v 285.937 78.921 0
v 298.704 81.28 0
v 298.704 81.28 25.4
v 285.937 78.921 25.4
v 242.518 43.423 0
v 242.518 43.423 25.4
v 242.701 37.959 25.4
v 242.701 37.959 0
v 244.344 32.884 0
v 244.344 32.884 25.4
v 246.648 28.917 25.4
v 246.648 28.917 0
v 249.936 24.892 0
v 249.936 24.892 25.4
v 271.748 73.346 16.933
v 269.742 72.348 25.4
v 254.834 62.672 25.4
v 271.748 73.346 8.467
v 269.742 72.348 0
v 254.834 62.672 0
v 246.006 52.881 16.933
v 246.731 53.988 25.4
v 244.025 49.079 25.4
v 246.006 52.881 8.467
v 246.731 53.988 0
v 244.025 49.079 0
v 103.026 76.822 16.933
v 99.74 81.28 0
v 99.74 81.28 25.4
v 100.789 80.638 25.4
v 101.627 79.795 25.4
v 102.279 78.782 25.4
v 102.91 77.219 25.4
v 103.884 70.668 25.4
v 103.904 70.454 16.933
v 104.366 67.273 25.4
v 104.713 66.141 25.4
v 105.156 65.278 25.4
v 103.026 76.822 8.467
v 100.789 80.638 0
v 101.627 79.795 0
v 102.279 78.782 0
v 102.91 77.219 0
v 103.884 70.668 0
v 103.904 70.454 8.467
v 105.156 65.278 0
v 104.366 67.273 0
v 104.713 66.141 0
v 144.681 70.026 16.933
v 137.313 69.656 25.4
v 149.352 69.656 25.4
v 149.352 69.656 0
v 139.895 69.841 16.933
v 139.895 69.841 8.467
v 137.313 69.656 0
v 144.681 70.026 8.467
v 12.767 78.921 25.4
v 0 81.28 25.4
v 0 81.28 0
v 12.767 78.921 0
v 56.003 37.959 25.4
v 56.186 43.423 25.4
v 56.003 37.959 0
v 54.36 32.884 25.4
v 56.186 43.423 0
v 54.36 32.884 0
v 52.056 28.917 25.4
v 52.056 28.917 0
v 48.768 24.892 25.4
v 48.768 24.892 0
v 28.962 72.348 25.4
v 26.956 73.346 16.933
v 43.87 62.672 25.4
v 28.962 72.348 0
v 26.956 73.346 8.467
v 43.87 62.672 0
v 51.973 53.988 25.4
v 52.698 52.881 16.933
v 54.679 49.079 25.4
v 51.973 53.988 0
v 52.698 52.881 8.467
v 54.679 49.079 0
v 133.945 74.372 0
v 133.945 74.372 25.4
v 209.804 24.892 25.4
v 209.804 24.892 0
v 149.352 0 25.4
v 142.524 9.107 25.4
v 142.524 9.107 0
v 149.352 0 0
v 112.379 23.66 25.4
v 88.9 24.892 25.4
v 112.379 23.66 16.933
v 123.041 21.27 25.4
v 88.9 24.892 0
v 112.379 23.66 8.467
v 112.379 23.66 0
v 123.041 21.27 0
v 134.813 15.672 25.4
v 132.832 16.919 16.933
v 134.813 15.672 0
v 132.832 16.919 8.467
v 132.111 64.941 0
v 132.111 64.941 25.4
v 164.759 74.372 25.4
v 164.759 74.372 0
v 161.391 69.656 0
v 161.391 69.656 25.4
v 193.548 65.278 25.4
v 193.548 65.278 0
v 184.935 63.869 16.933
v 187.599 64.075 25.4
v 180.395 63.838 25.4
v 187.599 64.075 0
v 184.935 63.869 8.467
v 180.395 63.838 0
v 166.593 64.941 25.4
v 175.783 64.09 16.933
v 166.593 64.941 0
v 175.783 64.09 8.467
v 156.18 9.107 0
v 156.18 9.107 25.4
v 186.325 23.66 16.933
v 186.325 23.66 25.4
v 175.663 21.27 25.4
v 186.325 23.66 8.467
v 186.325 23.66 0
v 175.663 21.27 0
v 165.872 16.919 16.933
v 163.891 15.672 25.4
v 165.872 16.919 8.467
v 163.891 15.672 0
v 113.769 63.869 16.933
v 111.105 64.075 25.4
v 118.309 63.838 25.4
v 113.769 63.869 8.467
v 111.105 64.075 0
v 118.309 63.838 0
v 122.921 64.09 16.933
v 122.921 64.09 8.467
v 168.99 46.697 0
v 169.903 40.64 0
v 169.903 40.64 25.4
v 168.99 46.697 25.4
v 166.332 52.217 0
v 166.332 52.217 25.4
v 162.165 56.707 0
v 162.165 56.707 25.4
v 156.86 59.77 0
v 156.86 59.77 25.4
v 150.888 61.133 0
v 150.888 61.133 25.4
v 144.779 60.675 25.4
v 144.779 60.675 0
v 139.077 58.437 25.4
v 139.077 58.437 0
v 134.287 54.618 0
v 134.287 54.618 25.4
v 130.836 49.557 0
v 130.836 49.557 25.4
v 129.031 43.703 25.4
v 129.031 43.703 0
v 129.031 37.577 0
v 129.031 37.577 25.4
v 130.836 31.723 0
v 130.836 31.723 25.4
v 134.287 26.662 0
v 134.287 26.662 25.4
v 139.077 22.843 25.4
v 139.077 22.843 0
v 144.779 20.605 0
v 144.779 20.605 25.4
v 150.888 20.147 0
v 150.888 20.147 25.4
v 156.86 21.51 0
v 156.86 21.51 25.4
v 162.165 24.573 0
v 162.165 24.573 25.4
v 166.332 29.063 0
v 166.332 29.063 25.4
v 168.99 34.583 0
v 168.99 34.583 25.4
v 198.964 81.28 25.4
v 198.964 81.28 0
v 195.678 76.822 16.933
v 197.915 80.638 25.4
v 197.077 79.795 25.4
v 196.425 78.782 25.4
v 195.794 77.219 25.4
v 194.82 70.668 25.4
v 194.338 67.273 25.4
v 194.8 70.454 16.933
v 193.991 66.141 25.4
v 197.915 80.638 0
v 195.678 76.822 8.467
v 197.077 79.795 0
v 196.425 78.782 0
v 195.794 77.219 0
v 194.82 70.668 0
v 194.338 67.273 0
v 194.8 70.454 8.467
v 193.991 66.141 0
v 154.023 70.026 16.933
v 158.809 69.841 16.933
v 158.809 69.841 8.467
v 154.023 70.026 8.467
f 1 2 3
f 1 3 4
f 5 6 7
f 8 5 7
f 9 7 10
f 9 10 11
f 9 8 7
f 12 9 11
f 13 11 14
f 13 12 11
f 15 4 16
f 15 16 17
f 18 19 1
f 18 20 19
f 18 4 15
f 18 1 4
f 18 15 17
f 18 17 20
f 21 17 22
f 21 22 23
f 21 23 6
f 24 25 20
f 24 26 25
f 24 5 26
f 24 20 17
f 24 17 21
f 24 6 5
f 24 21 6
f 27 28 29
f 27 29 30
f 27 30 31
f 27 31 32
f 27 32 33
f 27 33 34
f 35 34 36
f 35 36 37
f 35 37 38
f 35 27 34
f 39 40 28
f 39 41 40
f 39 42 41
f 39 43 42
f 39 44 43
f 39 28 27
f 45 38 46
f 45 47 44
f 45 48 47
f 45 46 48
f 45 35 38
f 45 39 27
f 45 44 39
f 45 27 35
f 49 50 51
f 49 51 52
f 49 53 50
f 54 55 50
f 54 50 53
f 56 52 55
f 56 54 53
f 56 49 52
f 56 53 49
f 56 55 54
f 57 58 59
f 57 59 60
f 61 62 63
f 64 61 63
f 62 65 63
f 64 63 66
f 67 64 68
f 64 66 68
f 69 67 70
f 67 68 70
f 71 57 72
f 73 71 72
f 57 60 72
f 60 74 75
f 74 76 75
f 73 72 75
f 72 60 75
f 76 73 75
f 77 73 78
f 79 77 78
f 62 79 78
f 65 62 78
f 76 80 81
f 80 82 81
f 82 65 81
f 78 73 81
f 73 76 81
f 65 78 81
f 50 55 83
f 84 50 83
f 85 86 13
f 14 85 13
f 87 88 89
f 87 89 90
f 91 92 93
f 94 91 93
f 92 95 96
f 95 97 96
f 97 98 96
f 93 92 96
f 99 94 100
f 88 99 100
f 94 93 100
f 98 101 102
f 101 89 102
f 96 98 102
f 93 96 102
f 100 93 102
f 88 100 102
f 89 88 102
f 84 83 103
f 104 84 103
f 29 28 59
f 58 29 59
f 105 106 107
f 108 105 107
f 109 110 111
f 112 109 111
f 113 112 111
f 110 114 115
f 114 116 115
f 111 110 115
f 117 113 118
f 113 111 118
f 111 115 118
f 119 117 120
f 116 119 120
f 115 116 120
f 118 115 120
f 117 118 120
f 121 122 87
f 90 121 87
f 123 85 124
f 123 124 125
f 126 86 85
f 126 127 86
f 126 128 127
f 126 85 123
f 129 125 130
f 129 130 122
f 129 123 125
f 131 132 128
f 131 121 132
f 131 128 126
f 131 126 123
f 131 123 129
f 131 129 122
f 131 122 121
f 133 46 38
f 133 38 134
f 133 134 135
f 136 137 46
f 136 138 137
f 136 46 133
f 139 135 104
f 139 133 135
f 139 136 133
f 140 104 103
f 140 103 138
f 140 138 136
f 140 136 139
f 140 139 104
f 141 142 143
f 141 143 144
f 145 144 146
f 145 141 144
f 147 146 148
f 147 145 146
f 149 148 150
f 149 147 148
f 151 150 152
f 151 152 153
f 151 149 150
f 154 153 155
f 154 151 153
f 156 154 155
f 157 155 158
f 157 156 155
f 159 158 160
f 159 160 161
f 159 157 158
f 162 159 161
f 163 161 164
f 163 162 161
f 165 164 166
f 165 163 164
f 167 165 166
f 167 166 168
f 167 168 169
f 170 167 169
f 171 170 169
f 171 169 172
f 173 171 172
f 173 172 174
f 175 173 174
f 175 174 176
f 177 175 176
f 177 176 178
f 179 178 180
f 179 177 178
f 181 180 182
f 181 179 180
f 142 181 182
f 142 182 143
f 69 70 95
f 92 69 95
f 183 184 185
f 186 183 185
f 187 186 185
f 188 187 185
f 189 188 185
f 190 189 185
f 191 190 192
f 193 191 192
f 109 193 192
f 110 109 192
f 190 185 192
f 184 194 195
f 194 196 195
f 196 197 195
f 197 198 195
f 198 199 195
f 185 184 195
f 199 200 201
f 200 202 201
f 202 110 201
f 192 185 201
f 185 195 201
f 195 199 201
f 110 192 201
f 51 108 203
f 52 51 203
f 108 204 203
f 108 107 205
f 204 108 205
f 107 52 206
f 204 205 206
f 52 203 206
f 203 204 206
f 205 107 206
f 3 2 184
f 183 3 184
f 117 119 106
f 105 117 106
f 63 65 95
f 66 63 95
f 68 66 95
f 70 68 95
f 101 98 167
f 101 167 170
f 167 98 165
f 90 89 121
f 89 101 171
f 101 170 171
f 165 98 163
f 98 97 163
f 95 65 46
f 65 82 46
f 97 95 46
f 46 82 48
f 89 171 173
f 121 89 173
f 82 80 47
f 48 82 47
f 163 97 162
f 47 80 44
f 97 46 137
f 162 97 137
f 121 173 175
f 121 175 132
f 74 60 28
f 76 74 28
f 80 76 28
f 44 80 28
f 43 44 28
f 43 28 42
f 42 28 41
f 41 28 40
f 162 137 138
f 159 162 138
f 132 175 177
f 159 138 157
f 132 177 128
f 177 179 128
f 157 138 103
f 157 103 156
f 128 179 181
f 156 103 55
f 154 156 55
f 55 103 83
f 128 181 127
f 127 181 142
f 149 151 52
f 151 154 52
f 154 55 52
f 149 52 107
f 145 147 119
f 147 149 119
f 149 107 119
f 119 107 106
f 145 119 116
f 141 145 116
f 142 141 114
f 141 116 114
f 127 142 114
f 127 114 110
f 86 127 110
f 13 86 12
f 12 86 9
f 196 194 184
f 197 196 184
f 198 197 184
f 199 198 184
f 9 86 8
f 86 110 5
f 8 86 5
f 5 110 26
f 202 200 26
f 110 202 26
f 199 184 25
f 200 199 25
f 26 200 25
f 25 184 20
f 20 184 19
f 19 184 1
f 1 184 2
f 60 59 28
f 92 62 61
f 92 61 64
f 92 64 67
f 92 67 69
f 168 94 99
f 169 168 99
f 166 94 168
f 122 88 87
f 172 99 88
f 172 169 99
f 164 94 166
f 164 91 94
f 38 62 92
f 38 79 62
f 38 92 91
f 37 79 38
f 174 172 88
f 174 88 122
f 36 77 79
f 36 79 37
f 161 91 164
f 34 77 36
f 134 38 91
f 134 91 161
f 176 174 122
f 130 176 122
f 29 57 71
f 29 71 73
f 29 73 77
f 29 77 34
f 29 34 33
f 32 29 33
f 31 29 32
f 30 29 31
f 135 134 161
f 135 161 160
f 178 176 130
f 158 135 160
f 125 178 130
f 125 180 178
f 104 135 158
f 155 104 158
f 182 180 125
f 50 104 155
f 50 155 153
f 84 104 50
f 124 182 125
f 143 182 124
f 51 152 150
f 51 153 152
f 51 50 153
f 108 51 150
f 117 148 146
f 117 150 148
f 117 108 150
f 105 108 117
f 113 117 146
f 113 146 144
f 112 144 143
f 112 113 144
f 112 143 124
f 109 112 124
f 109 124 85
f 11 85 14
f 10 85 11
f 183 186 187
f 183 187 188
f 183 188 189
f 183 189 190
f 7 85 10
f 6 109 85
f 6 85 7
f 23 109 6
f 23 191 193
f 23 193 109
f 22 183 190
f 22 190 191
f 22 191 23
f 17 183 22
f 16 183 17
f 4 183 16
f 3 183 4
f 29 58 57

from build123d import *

# Parameters (mm, degrees)
F0_R     = 20.550681
F1_DEPTH = 25.4


with BuildPart() as f1:
    # F0 (on Top) → F1 (new body)
    with BuildSketch(Plane.XY):
        with BuildLine():
            Line((48.768, 81.28), (0, 81.28))
            add(Edge.make_bspline(
                [(0, 81.28), (18.076837, 81.28), (77.019423, 54.973345), (48.768, 24.892)],
                knots=[0, 0, 0, 0, 74.551488, 74.551488, 74.551488, 74.551488], degree=3))
            Line((48.768, 24.892), (88.9, 24.892))
            add(Edge.make_bspline(
                [(88.9, 24.892), (113.589637, 24.856698), (135.101527, 23.565983), (149.352, 0)],
                knots=[0, 0, 0, 0, 65.376265, 65.376265, 65.376265, 65.376265], degree=3))
            add(Edge.make_bspline(
                [(209.804, 24.892), (185.114363, 24.856698), (163.602473, 23.565983), (149.352, 0)],
                knots=[0, 0, 0, 0, 65.376265, 65.376265, 65.376265, 65.376265], degree=3))
            Line((209.804, 24.892), (249.936, 24.892))
            add(Edge.make_bspline(
                [(298.704, 81.28), (280.627163, 81.28), (221.684577, 54.973345), (249.936, 24.892)],
                knots=[0, 0, 0, 0, 74.551488, 74.551488, 74.551488, 74.551488], degree=3))
            Line((298.704, 81.28), (198.964478, 81.28))
            add(Edge.make_bspline(
                [(198.964478, 81.28), (193.548, 78.810617), (195.913056, 68.824157), (193.548, 65.278)],
                knots=[0, 0, 0, 0, 16.893852, 16.893852, 16.893852, 16.893852], degree=3))
            add(Edge.make_bspline(
                [(193.548, 65.278), (185.371795, 62.721319), (175.635478, 64.108327), (166.593328, 64.940535)],
                knots=[0, 0, 0, 0, 26.956784, 26.956784, 26.956784, 26.956784], degree=3))
            Line((166.593328, 64.940535), (164.759207, 74.372195))
            Line((164.759207, 74.372195), (161.391426, 69.656365))
            add(Edge.make_bspline(
                [(161.391426, 69.656365), (160.683038, 69.656365), (153.193192, 70.488572), (149.352, 69.656365)],
                knots=[0, 0, 0, 0, 12.039426, 12.039426, 12.039426, 12.039426], degree=3))
            add(Edge.make_bspline(
                [(137.312574, 69.656365), (138.020962, 69.656365), (145.510808, 70.488572), (149.352, 69.656365)],
                knots=[0, 0, 0, 0, 12.039426, 12.039426, 12.039426, 12.039426], degree=3))
            Line((137.312574, 69.656365), (133.944793, 74.372195))
            Line((133.944793, 74.372195), (132.110672, 64.940535))
            add(Edge.make_bspline(
                [(105.156, 65.278), (113.332205, 62.721319), (123.068522, 64.108327), (132.110672, 64.940535)],
                knots=[0, 0, 0, 0, 26.956784, 26.956784, 26.956784, 26.956784], degree=3))
            add(Edge.make_bspline(
                [(99.739522, 81.28), (105.156, 78.810617), (102.790944, 68.824157), (105.156, 65.278)],
                knots=[0, 0, 0, 0, 16.893852, 16.893852, 16.893852, 16.893852], degree=3))
            Line((99.739522, 81.28), (56.134, 81.28))
            Line((56.134, 81.28), (48.768, 81.28))
        make_face()
        with Locations((149.352, 40.64)):
            Circle(F0_R, mode=Mode.SUBTRACT)
    extrude(amount=F1_DEPTH)


solid = f1.part
